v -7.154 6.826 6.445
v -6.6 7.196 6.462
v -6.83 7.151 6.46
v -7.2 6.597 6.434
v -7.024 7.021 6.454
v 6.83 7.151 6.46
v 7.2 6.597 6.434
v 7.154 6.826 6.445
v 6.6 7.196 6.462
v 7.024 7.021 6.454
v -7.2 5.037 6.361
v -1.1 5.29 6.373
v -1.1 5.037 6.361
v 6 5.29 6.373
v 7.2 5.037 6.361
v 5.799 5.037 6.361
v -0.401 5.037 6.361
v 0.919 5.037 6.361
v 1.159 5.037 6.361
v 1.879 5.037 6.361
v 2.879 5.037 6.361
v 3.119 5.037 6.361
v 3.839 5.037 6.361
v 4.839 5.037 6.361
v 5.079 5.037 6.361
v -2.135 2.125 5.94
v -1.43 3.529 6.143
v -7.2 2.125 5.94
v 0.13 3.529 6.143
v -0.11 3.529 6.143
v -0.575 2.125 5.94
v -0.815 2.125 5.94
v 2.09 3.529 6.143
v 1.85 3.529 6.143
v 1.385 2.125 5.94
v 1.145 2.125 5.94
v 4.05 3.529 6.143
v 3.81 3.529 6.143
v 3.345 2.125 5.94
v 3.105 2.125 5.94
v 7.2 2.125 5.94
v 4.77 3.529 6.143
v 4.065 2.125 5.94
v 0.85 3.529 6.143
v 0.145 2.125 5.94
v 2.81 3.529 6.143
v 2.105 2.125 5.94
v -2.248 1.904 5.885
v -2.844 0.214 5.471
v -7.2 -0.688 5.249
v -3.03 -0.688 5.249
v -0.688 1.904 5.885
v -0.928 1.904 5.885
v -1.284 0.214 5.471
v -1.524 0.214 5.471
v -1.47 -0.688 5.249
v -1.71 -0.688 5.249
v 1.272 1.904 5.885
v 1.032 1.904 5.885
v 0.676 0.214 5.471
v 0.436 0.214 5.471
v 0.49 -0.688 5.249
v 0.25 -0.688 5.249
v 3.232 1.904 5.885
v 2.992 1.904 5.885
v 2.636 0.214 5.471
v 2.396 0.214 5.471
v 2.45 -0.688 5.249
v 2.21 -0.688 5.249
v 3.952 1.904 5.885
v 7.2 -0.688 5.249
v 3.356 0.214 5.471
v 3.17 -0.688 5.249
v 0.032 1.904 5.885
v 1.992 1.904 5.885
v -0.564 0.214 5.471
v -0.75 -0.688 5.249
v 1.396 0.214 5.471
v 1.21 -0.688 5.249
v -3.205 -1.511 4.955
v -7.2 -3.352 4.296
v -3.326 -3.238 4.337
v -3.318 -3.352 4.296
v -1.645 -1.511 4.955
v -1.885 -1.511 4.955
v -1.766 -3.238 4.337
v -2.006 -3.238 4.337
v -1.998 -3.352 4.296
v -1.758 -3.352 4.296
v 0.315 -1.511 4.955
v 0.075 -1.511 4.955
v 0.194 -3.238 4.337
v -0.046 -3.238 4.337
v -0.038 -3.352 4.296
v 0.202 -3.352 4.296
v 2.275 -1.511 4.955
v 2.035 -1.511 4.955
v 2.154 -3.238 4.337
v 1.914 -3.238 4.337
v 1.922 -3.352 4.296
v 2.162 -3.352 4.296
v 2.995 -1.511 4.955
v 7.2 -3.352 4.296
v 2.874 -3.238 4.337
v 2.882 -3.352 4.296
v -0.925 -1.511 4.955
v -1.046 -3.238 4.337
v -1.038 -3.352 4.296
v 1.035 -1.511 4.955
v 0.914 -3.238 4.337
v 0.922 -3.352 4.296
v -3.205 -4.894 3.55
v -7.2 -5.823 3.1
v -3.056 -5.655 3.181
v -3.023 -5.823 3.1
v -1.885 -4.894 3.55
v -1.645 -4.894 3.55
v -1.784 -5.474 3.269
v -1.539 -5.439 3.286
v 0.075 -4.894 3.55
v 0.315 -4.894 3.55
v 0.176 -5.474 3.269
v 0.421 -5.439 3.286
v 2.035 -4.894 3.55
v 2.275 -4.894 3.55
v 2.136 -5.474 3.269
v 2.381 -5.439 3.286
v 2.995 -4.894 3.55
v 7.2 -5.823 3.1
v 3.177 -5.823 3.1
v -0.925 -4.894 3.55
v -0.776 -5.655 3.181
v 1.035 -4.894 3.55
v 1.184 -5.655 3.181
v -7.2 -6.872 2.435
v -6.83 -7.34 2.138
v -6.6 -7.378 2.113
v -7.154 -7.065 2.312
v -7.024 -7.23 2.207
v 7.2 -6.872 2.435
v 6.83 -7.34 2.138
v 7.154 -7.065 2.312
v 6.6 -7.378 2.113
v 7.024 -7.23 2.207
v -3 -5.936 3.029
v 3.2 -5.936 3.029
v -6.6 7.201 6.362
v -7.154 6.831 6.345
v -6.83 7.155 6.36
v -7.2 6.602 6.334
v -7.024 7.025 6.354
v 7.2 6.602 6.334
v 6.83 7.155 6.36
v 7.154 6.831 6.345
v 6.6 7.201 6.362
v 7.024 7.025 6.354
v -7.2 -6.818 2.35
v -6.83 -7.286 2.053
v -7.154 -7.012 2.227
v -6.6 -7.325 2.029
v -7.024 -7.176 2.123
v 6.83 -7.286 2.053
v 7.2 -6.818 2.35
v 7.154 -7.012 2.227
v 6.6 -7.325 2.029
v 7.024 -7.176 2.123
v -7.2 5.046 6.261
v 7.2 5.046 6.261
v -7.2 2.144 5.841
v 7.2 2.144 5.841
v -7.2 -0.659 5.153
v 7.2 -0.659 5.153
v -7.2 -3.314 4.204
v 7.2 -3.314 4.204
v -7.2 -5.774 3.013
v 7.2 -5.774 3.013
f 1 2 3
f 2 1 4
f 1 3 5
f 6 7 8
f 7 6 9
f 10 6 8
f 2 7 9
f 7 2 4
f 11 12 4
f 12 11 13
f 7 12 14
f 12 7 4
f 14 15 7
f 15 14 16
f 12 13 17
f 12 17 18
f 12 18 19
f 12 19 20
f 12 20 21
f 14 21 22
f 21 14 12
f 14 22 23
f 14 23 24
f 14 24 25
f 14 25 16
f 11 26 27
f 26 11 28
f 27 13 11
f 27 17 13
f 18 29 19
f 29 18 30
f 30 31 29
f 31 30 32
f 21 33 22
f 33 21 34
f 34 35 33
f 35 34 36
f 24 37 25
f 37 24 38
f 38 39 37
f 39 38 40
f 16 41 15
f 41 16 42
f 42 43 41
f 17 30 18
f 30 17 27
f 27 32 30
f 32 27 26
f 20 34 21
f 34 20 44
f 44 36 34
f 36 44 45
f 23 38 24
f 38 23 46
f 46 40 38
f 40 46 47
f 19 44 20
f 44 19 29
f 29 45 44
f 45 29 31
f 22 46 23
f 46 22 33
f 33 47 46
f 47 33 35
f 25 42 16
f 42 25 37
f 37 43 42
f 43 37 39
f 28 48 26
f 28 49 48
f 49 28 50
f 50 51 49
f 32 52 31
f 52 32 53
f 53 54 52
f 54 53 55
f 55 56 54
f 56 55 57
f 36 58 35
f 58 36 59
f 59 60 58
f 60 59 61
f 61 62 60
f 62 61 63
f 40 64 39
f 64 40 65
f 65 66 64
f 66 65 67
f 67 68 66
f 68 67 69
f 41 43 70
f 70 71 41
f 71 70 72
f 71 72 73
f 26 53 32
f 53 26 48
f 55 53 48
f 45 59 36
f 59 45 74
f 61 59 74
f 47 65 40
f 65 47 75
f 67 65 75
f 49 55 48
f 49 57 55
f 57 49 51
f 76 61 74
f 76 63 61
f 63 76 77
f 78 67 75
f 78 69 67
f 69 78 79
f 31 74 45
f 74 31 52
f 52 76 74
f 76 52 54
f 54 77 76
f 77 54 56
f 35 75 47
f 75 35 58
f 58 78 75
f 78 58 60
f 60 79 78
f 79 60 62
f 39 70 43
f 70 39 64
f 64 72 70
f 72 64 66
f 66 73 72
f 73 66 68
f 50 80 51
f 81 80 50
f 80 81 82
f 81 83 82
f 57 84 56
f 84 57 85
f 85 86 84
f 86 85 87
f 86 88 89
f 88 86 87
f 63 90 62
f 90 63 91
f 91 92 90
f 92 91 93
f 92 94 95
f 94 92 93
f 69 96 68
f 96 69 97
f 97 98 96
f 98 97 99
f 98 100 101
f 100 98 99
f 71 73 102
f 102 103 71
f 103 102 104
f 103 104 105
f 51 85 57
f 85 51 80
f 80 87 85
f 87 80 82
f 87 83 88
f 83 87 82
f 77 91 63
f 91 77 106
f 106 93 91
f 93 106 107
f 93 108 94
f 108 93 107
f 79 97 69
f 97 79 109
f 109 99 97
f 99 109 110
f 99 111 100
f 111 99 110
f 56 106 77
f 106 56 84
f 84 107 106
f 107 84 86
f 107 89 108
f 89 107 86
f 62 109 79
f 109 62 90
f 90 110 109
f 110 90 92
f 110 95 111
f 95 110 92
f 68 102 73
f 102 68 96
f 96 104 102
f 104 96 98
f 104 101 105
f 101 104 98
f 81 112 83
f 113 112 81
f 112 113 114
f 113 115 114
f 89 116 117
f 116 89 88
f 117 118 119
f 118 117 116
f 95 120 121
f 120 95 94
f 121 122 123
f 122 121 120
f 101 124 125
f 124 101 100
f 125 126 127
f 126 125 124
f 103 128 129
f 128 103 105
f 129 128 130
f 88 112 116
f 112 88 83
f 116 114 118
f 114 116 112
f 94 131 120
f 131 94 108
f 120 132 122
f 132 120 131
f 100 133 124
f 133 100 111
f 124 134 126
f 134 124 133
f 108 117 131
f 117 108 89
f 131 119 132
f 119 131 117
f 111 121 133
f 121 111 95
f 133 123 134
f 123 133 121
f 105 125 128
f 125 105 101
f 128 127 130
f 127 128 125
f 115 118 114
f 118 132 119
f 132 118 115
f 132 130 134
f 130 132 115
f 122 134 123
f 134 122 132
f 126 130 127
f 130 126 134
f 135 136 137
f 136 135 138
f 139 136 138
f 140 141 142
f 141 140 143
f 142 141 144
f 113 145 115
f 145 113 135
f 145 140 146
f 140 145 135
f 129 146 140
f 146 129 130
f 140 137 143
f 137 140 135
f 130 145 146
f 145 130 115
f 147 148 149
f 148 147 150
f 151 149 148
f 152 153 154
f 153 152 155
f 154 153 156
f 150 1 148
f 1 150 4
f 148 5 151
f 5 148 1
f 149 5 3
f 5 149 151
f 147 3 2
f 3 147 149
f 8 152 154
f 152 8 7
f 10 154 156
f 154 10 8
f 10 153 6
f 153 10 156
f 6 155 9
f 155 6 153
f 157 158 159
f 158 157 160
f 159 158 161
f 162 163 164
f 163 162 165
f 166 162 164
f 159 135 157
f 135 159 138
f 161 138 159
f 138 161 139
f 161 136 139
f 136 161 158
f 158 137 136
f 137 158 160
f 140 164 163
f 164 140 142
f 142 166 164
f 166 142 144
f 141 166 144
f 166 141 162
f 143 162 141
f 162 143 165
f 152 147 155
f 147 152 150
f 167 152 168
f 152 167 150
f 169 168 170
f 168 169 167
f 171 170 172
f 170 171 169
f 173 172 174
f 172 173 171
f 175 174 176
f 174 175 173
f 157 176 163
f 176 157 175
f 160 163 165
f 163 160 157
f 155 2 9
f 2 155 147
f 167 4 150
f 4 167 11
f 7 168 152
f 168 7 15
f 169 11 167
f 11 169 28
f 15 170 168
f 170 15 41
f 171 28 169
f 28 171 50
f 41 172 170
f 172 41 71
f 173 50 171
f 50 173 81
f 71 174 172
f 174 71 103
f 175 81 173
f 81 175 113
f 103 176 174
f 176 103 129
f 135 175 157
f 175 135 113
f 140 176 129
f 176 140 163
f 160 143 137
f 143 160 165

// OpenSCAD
// file: ../p/1-4cyli.scad
use <../lib.scad>
function ldraw_lib__1_4cyli() = [
// 0 Cylinder 0.25
// 0 Name: 1-4cyli.dat
// 0 Author: James Jessiman
// 0 !LDRAW_ORG Primitive UPDATE 2012-01
// 0 !LICENSE Licensed under CC BY 4.0 : see CAreadme.txt
// 
// 0 BFC CERTIFY CCW
  [0,"BFC","CERTIFY"],
  [0,"BFC","CCW"],
// 
// 0 !HISTORY 2002-03-23 [sbliss] Added BFC statement.
// 0 !HISTORY 2002-04-25 [PTadmin] Official Update 2002-02
// 0 !HISTORY 2007-06-22 [PTadmin] Header formatted for Contributor Agreement
// 0 !HISTORY 2008-07-01 [PTadmin] Official Update 2008-01
// 0 !HISTORY 2012-02-16 [Philo] Changed to CCW
// 0 !HISTORY 2012-03-30 [PTadmin] Official Update 2012-01
// 
// 
// 4 16 1 1 0 0.9239 1 0.3827 0.9239 0 0.3827 1 0 0
  [4,16,1,1,0,0.9239,1,0.3827,0.9239,0,0.3827,1,0,0],
// 5 24 1 0 0 1 1 0 0.9239 0 0.3827 1 0 -1
  [5,24,1,0,0,1,1,0,0.9239,0,0.3827,1,0,-1],
// 4 16 0.9239 1 0.3827 0.7071 1 0.7071 0.7071 0 0.7071 0.9239 0 0.3827
  [4,16,0.9239,1,0.3827,0.7071,1,0.7071,0.7071,0,0.7071,0.9239,0,0.3827],
// 5 24 0.9239 0 0.3827 0.9239 1 0.3827 0.7071 0 0.7071 1 0 0
  [5,24,0.9239,0,0.3827,0.9239,1,0.3827,0.7071,0,0.7071,1,0,0],
// 4 16 0.7071 1 0.7071 0.3827 1 0.9239 0.3827 0 0.9239 0.7071 0 0.7071
  [4,16,0.7071,1,0.7071,0.3827,1,0.9239,0.3827,0,0.9239,0.7071,0,0.7071],
// 5 24 0.7071 0 0.7071 0.7071 1 0.7071 0.3827 0 0.9239 0.9239 0 0.3827
  [5,24,0.7071,0,0.7071,0.7071,1,0.7071,0.3827,0,0.9239,0.9239,0,0.3827],
// 4 16 0.3827 1 0.9239 0 1 1 0 0 1 0.3827 0 0.9239
  [4,16,0.3827,1,0.9239,0,1,1,0,0,1,0.3827,0,0.9239],
// 5 24 0.3827 0 0.9239 0.3827 1 0.9239 0 0 1 0.7071 0 0.7071
  [5,24,0.3827,0,0.9239,0.3827,1,0.9239,0,0,1,0.7071,0,0.7071],
// 5 24 0 0 1 0 1 1 0.3827 0 0.9239 -1 0 1
  [5,24,0,0,1,0,1,1,0.3827,0,0.9239,-1,0,1],
];
module ldraw_lib__1_4cyli(step=0, col=false, unit=2/5, alt=false, line=0.2, solid=!$preview)
    makepoly(ldraw_lib__1_4cyli(), step=step, col=col, unit=unit, alt=alt, line=line, solid=solid);
ldraw_lib__1_4cyli(line=0.2);
// file: ../p/1-4chrd.scad
use <../lib.scad>
function ldraw_lib__1_4chrd() = [
// 0 Chord 0.25
// 0 Name: 1-4chrd.dat
// 0 Author: Max Martin Richter [MMR1988]
// 0 !LDRAW_ORG Primitive UPDATE 2023-05
// 0 !LICENSE Licensed under CC BY 4.0 : see CAreadme.txt
// 
// 0 BFC CERTIFY CCW
  [0,"BFC","CERTIFY"],
  [0,"BFC","CCW"],
// 
// 0 !HISTORY 2004-04-22 [PTadmin] Official Update 2004-02
// 0 !HISTORY 2007-10-09 [PTadmin] Header formatted for Contributor Agreement
// 0 !HISTORY 2008-07-01 [PTadmin] Official Update 2008-01
// 0 !HISTORY 2012-08-02 [MMR1988] Re-creation with PrimGen2 and Rectifier
// 0 !HISTORY 2012-08-09 [PTadmin] Official Update 2012-02
// 0 !HISTORY 2023-10-27 [OrionP] Change author to MMR1988 from hafhead
// 0 !HISTORY 2023-10-31 [OrionP] Official Update 2023-05
// 
// 4 16 0.9239 0 0.3827 0.3827 0 0.9239 0 0 1 1 0 0
  [4,16,0.9239,0,0.3827,0.3827,0,0.9239,0,0,1,1,0,0],
// 3 16 0.7071 0 0.7071 0.3827 0 0.9239 0.9239 0 0.3827
  [3,16,0.7071,0,0.7071,0.3827,0,0.9239,0.9239,0,0.3827],
];
module ldraw_lib__1_4chrd(step=0, col=false, unit=2/5, alt=false, line=0.2, solid=!$preview)
    makepoly(ldraw_lib__1_4chrd(), step=step, col=col, unit=unit, alt=alt, line=line, solid=solid);
ldraw_lib__1_4chrd(line=0.2);
// file: s/6142617ss06.scad
use <../../lib.scad>
use <../../p/1-4chrd.scad>
function ldraw_lib__s__6142617ss06() = [
// 0 ~Sticker  1.9 x  1.8 with Silver Air Vents on Black Background Left - Sixth Face
// 0 Name: s\6142617ss06.dat
// 0 Author: Massimo Maso [Sirio]
// 0 !LDRAW_ORG Subpart UPDATE 2023-05
// 0 !LICENSE Licensed under CC BY 4.0 : see CAreadme.txt
// 
// 0 BFC CERTIFY CCW
  [0,"BFC","CERTIFY"],
  [0,"BFC","CCW"],
// 
// 0 !HISTORY 2023-10-31 [OrionP] Official Update 2023-05
// 
// 
// 0 // Primitives
// 1 0 -16.5 -.25 -3.0901 -1.5 0 0 0 1 0 0 0 -1.5 1-4chrd.dat
  [1,0,-16.5,-.25,-3.0901,-1.5,0,0,0,1,0,0,0,-1.5, ldraw_lib__1_4chrd()],
// 1 0 16.5 -.25 -3.0901 1.5 0 0 0 1 0 0 0 -1.5 1-4chrd.dat
  [1,0,16.5,-.25,-3.0901,1.5,0,0,0,1,0,0,0,-1.5, ldraw_lib__1_4chrd()],
// 0 // Black faces
// 4 0 -18 -.25 -3.0901 -7.5 -.25 -.319 -7.5587 -.25 .0144 -18 -.25 .0144
  [4,0,-18,-.25,-3.0901,-7.5,-.25,-.319,-7.5587,-.25,.0144,-18,-.25,.0144],
// 4 0 -18 -.25 -3.0901 18 -.25 -3.0901 8 -.25 -.319 -7.5 -.25 -.319
  [4,0,-18,-.25,-3.0901,18,-.25,-3.0901,8,-.25,-.319,-7.5,-.25,-.319],
// 4 0 18 -.25 -3.0901 18 -.25 .0144 7.9413 -.25 .0144 8 -.25 -.319
  [4,0,18,-.25,-3.0901,18,-.25,.0144,7.9413,-.25,.0144,8,-.25,-.319],
// 4 0 18 -.25 -3.0901 -18 -.25 -3.0901 -16.5 -.25 -4.5901 16.5 -.25 -4.5901
  [4,0,18,-.25,-3.0901,-18,-.25,-3.0901,-16.5,-.25,-4.5901,16.5,-.25,-4.5901],
// 0 // Silver face
// 4 80 -7.5587 -.25 .0144 -7.5 -.25 -.319 8 -.25 -.319 7.9413 -.25 .0144
  [4,80,-7.5587,-.25,.0144,-7.5,-.25,-.319,8,-.25,-.319,7.9413,-.25,.0144],
];
module ldraw_lib__s__6142617ss06(step=0, col=false, unit=2/5, alt=false, line=0.2, solid=!$preview)
    makepoly(ldraw_lib__s__6142617ss06(), step=step, col=col, unit=unit, alt=alt, line=line, solid=solid);
ldraw_lib__s__6142617ss06(line=0.2);
// file: s/6142617ss05.scad
use <../../lib.scad>
function ldraw_lib__s__6142617ss05() = [
// 0 ~Sticker  1.9 x  1.8 with Silver Air Vents on Black Background Left - Fifth Face
// 0 Name: s\6142617ss05.dat
// 0 Author: Massimo Maso [Sirio]
// 0 !LDRAW_ORG Subpart UPDATE 2023-05
// 0 !LICENSE Licensed under CC BY 4.0 : see CAreadme.txt
// 
// 0 BFC CERTIFY CCW
  [0,"BFC","CERTIFY"],
  [0,"BFC","CCW"],
// 
// 0 !HISTORY 2023-10-31 [OrionP] Official Update 2023-05
// 
// 
// 0 // Black faces
// 3 0 -18 -.25 6.8484 -8.0132 -.25 2.5659 -8.2961 -.25 6.8484
  [3,0,-18,-.25,6.8484,-8.0132,-.25,2.5659,-8.2961,-.25,6.8484],
// 4 0 -18 -.25 6.8484 -18 -.25 -.0144 -7.6409 -.25 .4522 -8.0132 -.25 2.5659
  [4,0,-18,-.25,6.8484,-18,-.25,-.0144,-7.6409,-.25,.4522,-8.0132,-.25,2.5659],
// 3 0 -18 -.25 -.0144 -7.5587 -.25 -.0144 -7.6409 -.25 .4522
  [3,0,-18,-.25,-.0144,-7.5587,-.25,-.0144,-7.6409,-.25,.4522],
// 4 0 -4.7132 -.25 2.5659 -4.1132 -.25 2.5659 -4.3961 -.25 6.8484 -4.9961 -.25 6.8484
  [4,0,-4.7132,-.25,2.5659,-4.1132,-.25,2.5659,-4.3961,-.25,6.8484,-4.9961,-.25,6.8484],
// 4 0 -4.7132 -.25 2.5659 -4.461 -.25 .955 -3.8466 -.25 1.0522 -4.1132 -.25 2.5659
  [4,0,-4.7132,-.25,2.5659,-4.461,-.25,.955,-3.8466,-.25,1.0522,-4.1132,-.25,2.5659],
// 4 0 .1868 -.25 2.5659 .7868 -.25 2.5659 .5039 -.25 6.8484 -.0961 -.25 6.8484
  [4,0,.1868,-.25,2.5659,.7868,-.25,2.5659,.5039,-.25,6.8484,-.0961,-.25,6.8484],
// 4 0 .1868 -.25 2.5659 .439 -.25 .955 1.0534 -.25 1.0522 .7868 -.25 2.5659
  [4,0,.1868,-.25,2.5659,.439,-.25,.955,1.0534,-.25,1.0522,.7868,-.25,2.5659],
// 4 0 5.0868 -.25 2.5659 5.6868 -.25 2.5659 5.4039 -.25 6.8484 4.8039 -.25 6.8484
  [4,0,5.0868,-.25,2.5659,5.6868,-.25,2.5659,5.4039,-.25,6.8484,4.8039,-.25,6.8484],
// 4 0 5.0868 -.25 2.5659 5.339 -.25 .955 5.9534 -.25 1.0522 5.6868 -.25 2.5659
  [4,0,5.0868,-.25,2.5659,5.339,-.25,.955,5.9534,-.25,1.0522,5.6868,-.25,2.5659],
// 4 0 18 -.25 -.0144 18 -.25 6.8484 7.2039 -.25 6.8484 7.4868 -.25 2.5659
  [4,0,18,-.25,-.0144,18,-.25,6.8484,7.2039,-.25,6.8484,7.4868,-.25,2.5659],
// 3 0 18 -.25 -.0144 7.4868 -.25 2.5659 7.9413 -.25 -.0144
  [3,0,18,-.25,-.0144,7.4868,-.25,2.5659,7.9413,-.25,-.0144],
// 0 // Grey faces
// 4 71 -8.0132 -.25 2.5659 -4.7132 -.25 2.5659 -4.9961 -.25 6.8484 -8.2961 -.25 6.8484
  [4,71,-8.0132,-.25,2.5659,-4.7132,-.25,2.5659,-4.9961,-.25,6.8484,-8.2961,-.25,6.8484],
// 4 71 -8.0132 -.25 2.5659 -7.6409 -.25 .4522 -4.461 -.25 .955 -4.7132 -.25 2.5659
  [4,71,-8.0132,-.25,2.5659,-7.6409,-.25,.4522,-4.461,-.25,.955,-4.7132,-.25,2.5659],
// 4 71 -2.3132 -.25 2.5659 .1868 -.25 2.5659 -.0961 -.25 6.8484 -2.5961 -.25 6.8484
  [4,71,-2.3132,-.25,2.5659,.1868,-.25,2.5659,-.0961,-.25,6.8484,-2.5961,-.25,6.8484],
// 4 71 -2.3132 -.25 2.5659 -1.9409 -.25 .4522 .439 -.25 .955 .1868 -.25 2.5659
  [4,71,-2.3132,-.25,2.5659,-1.9409,-.25,.4522,.439,-.25,.955,.1868,-.25,2.5659],
// 4 71 2.5868 -.25 2.5659 5.0868 -.25 2.5659 4.8039 -.25 6.8484 2.3039 -.25 6.8484
  [4,71,2.5868,-.25,2.5659,5.0868,-.25,2.5659,4.8039,-.25,6.8484,2.3039,-.25,6.8484],
// 4 71 2.5868 -.25 2.5659 2.9591 -.25 .4522 5.339 -.25 .955 5.0868 -.25 2.5659
  [4,71,2.5868,-.25,2.5659,2.9591,-.25,.4522,5.339,-.25,.955,5.0868,-.25,2.5659],
// 0 // Silver faces
// 4 80 -4.1132 -.25 2.5659 -2.3132 -.25 2.5659 -2.5961 -.25 6.8484 -4.3961 -.25 6.8484
  [4,80,-4.1132,-.25,2.5659,-2.3132,-.25,2.5659,-2.5961,-.25,6.8484,-4.3961,-.25,6.8484],
// 4 80 -4.1132 -.25 2.5659 -3.8466 -.25 1.0522 -1.9409 -.25 .4522 -2.3132 -.25 2.5659
  [4,80,-4.1132,-.25,2.5659,-3.8466,-.25,1.0522,-1.9409,-.25,.4522,-2.3132,-.25,2.5659],
// 4 80 .7868 -.25 2.5659 2.5868 -.25 2.5659 2.3039 -.25 6.8484 .5039 -.25 6.8484
  [4,80,.7868,-.25,2.5659,2.5868,-.25,2.5659,2.3039,-.25,6.8484,.5039,-.25,6.8484],
// 4 80 .7868 -.25 2.5659 1.0534 -.25 1.0522 2.9591 -.25 .4522 2.5868 -.25 2.5659
  [4,80,.7868,-.25,2.5659,1.0534,-.25,1.0522,2.9591,-.25,.4522,2.5868,-.25,2.5659],
// 4 80 5.6868 -.25 2.5659 7.4868 -.25 2.5659 7.2039 -.25 6.8484 5.4039 -.25 6.8484
  [4,80,5.6868,-.25,2.5659,7.4868,-.25,2.5659,7.2039,-.25,6.8484,5.4039,-.25,6.8484],
// 4 80 5.6868 -.25 2.5659 5.9534 -.25 1.0522 7.9413 -.25 -.0144 7.4868 -.25 2.5659
  [4,80,5.6868,-.25,2.5659,5.9534,-.25,1.0522,7.9413,-.25,-.0144,7.4868,-.25,2.5659],
// 3 80 -7.5587 -.25 -.0144 -4.461 -.25 .955 -7.6409 -.25 .4522
  [3,80,-7.5587,-.25,-.0144,-4.461,-.25,.955,-7.6409,-.25,.4522],
// 4 80 -7.5587 -.25 -.0144 -1.9409 -.25 .4522 -3.8466 -.25 1.0522 -4.461 -.25 .955
  [4,80,-7.5587,-.25,-.0144,-1.9409,-.25,.4522,-3.8466,-.25,1.0522,-4.461,-.25,.955],
// 4 80 -7.5587 -.25 -.0144 7.9413 -.25 -.0144 2.9591 -.25 .4522 -1.9409 -.25 .4522
  [4,80,-7.5587,-.25,-.0144,7.9413,-.25,-.0144,2.9591,-.25,.4522,-1.9409,-.25,.4522],
// 4 80 2.9591 -.25 .4522 1.0534 -.25 1.0522 .439 -.25 .955 -1.9409 -.25 .4522
  [4,80,2.9591,-.25,.4522,1.0534,-.25,1.0522,.439,-.25,.955,-1.9409,-.25,.4522],
// 4 80 2.9591 -.25 .4522 7.9413 -.25 -.0144 5.9534 -.25 1.0522 5.339 -.25 .955
  [4,80,2.9591,-.25,.4522,7.9413,-.25,-.0144,5.9534,-.25,1.0522,5.339,-.25,.955],
];
module ldraw_lib__s__6142617ss05(step=0, col=false, unit=2/5, alt=false, line=0.2, solid=!$preview)
    makepoly(ldraw_lib__s__6142617ss05(), step=step, col=col, unit=unit, alt=alt, line=line, solid=solid);
ldraw_lib__s__6142617ss05(line=0.2);
// file: s/6142617ss04.scad
use <../../lib.scad>
function ldraw_lib__s__6142617ss04() = [
// 0 ~Sticker  1.9 x  1.8 with Silver Air Vents on Black Background Left - Fourth Face
// 0 Name: s\6142617ss04.dat
// 0 Author: Massimo Maso [Sirio]
// 0 !LDRAW_ORG Subpart UPDATE 2023-05
// 0 !LICENSE Licensed under CC BY 4.0 : see CAreadme.txt
// 
// 0 BFC CERTIFY CCW
  [0,"BFC","CERTIFY"],
  [0,"BFC","CCW"],
// 
// 0 !HISTORY 2023-10-31 [OrionP] Official Update 2023-05
// 
// 
// 0 // Black faces
// 3 0 -18 -.25 .0128 -8.0132 -.25 -2.1709 -7.5754 -.25 .0128
  [3,0,-18,-.25,.0128,-8.0132,-.25,-2.1709,-7.5754,-.25,.0128],
// 4 0 -18 -.25 .0128 -18 -.25 -7.061 -8.3161 -.25 -6.7572 -8.0132 -.25 -2.1709
  [4,0,-18,-.25,.0128,-18,-.25,-7.061,-8.3161,-.25,-6.7572,-8.0132,-.25,-2.1709],
// 3 0 -18 -.25 -7.061 -8.2961 -.25 -7.061 -8.3161 -.25 -6.7572
  [3,0,-18,-.25,-7.061,-8.2961,-.25,-7.061,-8.3161,-.25,-6.7572],
// 4 0 -4.7132 -.25 -2.1709 -4.1132 -.25 -2.1709 -3.6754 -.25 .0128 -4.2754 -.25 .0128
  [4,0,-4.7132,-.25,-2.1709,-4.1132,-.25,-2.1709,-3.6754,-.25,.0128,-4.2754,-.25,.0128],
// 4 0 -4.7132 -.25 -2.1709 -5.0161 -.25 -6.7572 -4.4161 -.25 -6.7572 -4.1132 -.25 -2.1709
  [4,0,-4.7132,-.25,-2.1709,-5.0161,-.25,-6.7572,-4.4161,-.25,-6.7572,-4.1132,-.25,-2.1709],
// 4 0 -5.0161 -.25 -6.7572 -4.9961 -.25 -7.061 -4.3961 -.25 -7.061 -4.4161 -.25 -6.7572
  [4,0,-5.0161,-.25,-6.7572,-4.9961,-.25,-7.061,-4.3961,-.25,-7.061,-4.4161,-.25,-6.7572],
// 4 0 .1868 -.25 -2.1709 .7868 -.25 -2.1709 1.2246 -.25 .0128 .6246 -.25 .0128
  [4,0,.1868,-.25,-2.1709,.7868,-.25,-2.1709,1.2246,-.25,.0128,.6246,-.25,.0128],
// 4 0 .1868 -.25 -2.1709 -.1161 -.25 -6.7572 .4839 -.25 -6.7572 .7868 -.25 -2.1709
  [4,0,.1868,-.25,-2.1709,-.1161,-.25,-6.7572,.4839,-.25,-6.7572,.7868,-.25,-2.1709],
// 4 0 -.1161 -.25 -6.7572 -.0961 -.25 -7.061 .5039 -.25 -7.061 .4839 -.25 -6.7572
  [4,0,-.1161,-.25,-6.7572,-.0961,-.25,-7.061,.5039,-.25,-7.061,.4839,-.25,-6.7572],
// 4 0 5.0868 -.25 -2.1709 5.6868 -.25 -2.1709 6.1246 -.25 .0128 5.5246 -.25 .0128
  [4,0,5.0868,-.25,-2.1709,5.6868,-.25,-2.1709,6.1246,-.25,.0128,5.5246,-.25,.0128],
// 4 0 5.0868 -.25 -2.1709 4.7839 -.25 -6.7572 5.3839 -.25 -6.7572 5.6868 -.25 -2.1709
  [4,0,5.0868,-.25,-2.1709,4.7839,-.25,-6.7572,5.3839,-.25,-6.7572,5.6868,-.25,-2.1709],
// 4 0 4.7839 -.25 -6.7572 4.8039 -.25 -7.061 5.4039 -.25 -7.061 5.3839 -.25 -6.7572
  [4,0,4.7839,-.25,-6.7572,4.8039,-.25,-7.061,5.4039,-.25,-7.061,5.3839,-.25,-6.7572],
// 3 0 18 -.25 .0128 7.9246 -.25 .0128 7.4868 -.25 -2.1709
  [3,0,18,-.25,.0128,7.9246,-.25,.0128,7.4868,-.25,-2.1709],
// 4 0 18 -.25 -7.061 18 -.25 .0128 7.4868 -.25 -2.1709 7.1839 -.25 -6.7572
  [4,0,18,-.25,-7.061,18,-.25,.0128,7.4868,-.25,-2.1709,7.1839,-.25,-6.7572],
// 3 0 18 -.25 -7.061 7.1839 -.25 -6.7572 7.2039 -.25 -7.061
  [3,0,18,-.25,-7.061,7.1839,-.25,-6.7572,7.2039,-.25,-7.061],
// 0 // Grey faces
// 4 71 -8.0132 -.25 -2.1709 -4.7132 -.25 -2.1709 -4.2754 -.25 .0128 -7.5754 -.25 .0128
  [4,71,-8.0132,-.25,-2.1709,-4.7132,-.25,-2.1709,-4.2754,-.25,.0128,-7.5754,-.25,.0128],
// 4 71 -8.0132 -.25 -2.1709 -8.3161 -.25 -6.7572 -5.0161 -.25 -6.7572 -4.7132 -.25 -2.1709
  [4,71,-8.0132,-.25,-2.1709,-8.3161,-.25,-6.7572,-5.0161,-.25,-6.7572,-4.7132,-.25,-2.1709],
// 4 71 -8.3161 -.25 -6.7572 -8.2961 -.25 -7.061 -4.9961 -.25 -7.061 -5.0161 -.25 -6.7572
  [4,71,-8.3161,-.25,-6.7572,-8.2961,-.25,-7.061,-4.9961,-.25,-7.061,-5.0161,-.25,-6.7572],
// 4 71 -2.3132 -.25 -2.1709 .1868 -.25 -2.1709 .6246 -.25 .0128 -1.8754 -.25 .0128
  [4,71,-2.3132,-.25,-2.1709,.1868,-.25,-2.1709,.6246,-.25,.0128,-1.8754,-.25,.0128],
// 4 71 -2.3132 -.25 -2.1709 -2.6161 -.25 -6.7572 -.1161 -.25 -6.7572 .1868 -.25 -2.1709
  [4,71,-2.3132,-.25,-2.1709,-2.6161,-.25,-6.7572,-.1161,-.25,-6.7572,.1868,-.25,-2.1709],
// 4 71 -2.6161 -.25 -6.7572 -2.5961 -.25 -7.061 -.0961 -.25 -7.061 -.1161 -.25 -6.7572
  [4,71,-2.6161,-.25,-6.7572,-2.5961,-.25,-7.061,-.0961,-.25,-7.061,-.1161,-.25,-6.7572],
// 4 71 2.5868 -.25 -2.1709 5.0868 -.25 -2.1709 5.5246 -.25 .0128 3.0246 -.25 .0128
  [4,71,2.5868,-.25,-2.1709,5.0868,-.25,-2.1709,5.5246,-.25,.0128,3.0246,-.25,.0128],
// 4 71 2.5868 -.25 -2.1709 2.2839 -.25 -6.7572 4.7839 -.25 -6.7572 5.0868 -.25 -2.1709
  [4,71,2.5868,-.25,-2.1709,2.2839,-.25,-6.7572,4.7839,-.25,-6.7572,5.0868,-.25,-2.1709],
// 4 71 2.2839 -.25 -6.7572 2.3039 -.25 -7.061 4.8039 -.25 -7.061 4.7839 -.25 -6.7572
  [4,71,2.2839,-.25,-6.7572,2.3039,-.25,-7.061,4.8039,-.25,-7.061,4.7839,-.25,-6.7572],
// 0 // Silver faces
// 4 80 -4.1132 -.25 -2.1709 -2.3132 -.25 -2.1709 -1.8754 -.25 .0128 -3.6754 -.25 .0128
  [4,80,-4.1132,-.25,-2.1709,-2.3132,-.25,-2.1709,-1.8754,-.25,.0128,-3.6754,-.25,.0128],
// 4 80 -4.1132 -.25 -2.1709 -4.4161 -.25 -6.7572 -2.6161 -.25 -6.7572 -2.3132 -.25 -2.1709
  [4,80,-4.1132,-.25,-2.1709,-4.4161,-.25,-6.7572,-2.6161,-.25,-6.7572,-2.3132,-.25,-2.1709],
// 4 80 -4.4161 -.25 -6.7572 -4.3961 -.25 -7.061 -2.5961 -.25 -7.061 -2.6161 -.25 -6.7572
  [4,80,-4.4161,-.25,-6.7572,-4.3961,-.25,-7.061,-2.5961,-.25,-7.061,-2.6161,-.25,-6.7572],
// 4 80 .7868 -.25 -2.1709 2.5868 -.25 -2.1709 3.0246 -.25 .0128 1.2246 -.25 .0128
  [4,80,.7868,-.25,-2.1709,2.5868,-.25,-2.1709,3.0246,-.25,.0128,1.2246,-.25,.0128],
// 4 80 .7868 -.25 -2.1709 .4839 -.25 -6.7572 2.2839 -.25 -6.7572 2.5868 -.25 -2.1709
  [4,80,.7868,-.25,-2.1709,.4839,-.25,-6.7572,2.2839,-.25,-6.7572,2.5868,-.25,-2.1709],
// 4 80 .4839 -.25 -6.7572 .5039 -.25 -7.061 2.3039 -.25 -7.061 2.2839 -.25 -6.7572
  [4,80,.4839,-.25,-6.7572,.5039,-.25,-7.061,2.3039,-.25,-7.061,2.2839,-.25,-6.7572],
// 4 80 5.6868 -.25 -2.1709 7.4868 -.25 -2.1709 7.9246 -.25 .0128 6.1246 -.25 .0128
  [4,80,5.6868,-.25,-2.1709,7.4868,-.25,-2.1709,7.9246,-.25,.0128,6.1246,-.25,.0128],
// 4 80 5.6868 -.25 -2.1709 5.3839 -.25 -6.7572 7.1839 -.25 -6.7572 7.4868 -.25 -2.1709
  [4,80,5.6868,-.25,-2.1709,5.3839,-.25,-6.7572,7.1839,-.25,-6.7572,7.4868,-.25,-2.1709],
// 4 80 5.3839 -.25 -6.7572 5.4039 -.25 -7.061 7.2039 -.25 -7.061 7.1839 -.25 -6.7572
  [4,80,5.3839,-.25,-6.7572,5.4039,-.25,-7.061,7.2039,-.25,-7.061,7.1839,-.25,-6.7572],
];
module ldraw_lib__s__6142617ss04(step=0, col=false, unit=2/5, alt=false, line=0.2, solid=!$preview)
    makepoly(ldraw_lib__s__6142617ss04(), step=step, col=col, unit=unit, alt=alt, line=line, solid=solid);
ldraw_lib__s__6142617ss04(line=0.2);
// file: s/6142617ss03.scad
use <../../lib.scad>
function ldraw_lib__s__6142617ss03() = [
// 0 ~Sticker  1.9 x  1.8 with Silver Air Vents on Black Background Left - Third Face
// 0 Name: s\6142617ss03.dat
// 0 Author: Massimo Maso [Sirio]
// 0 !LDRAW_ORG Subpart UPDATE 2023-05
// 0 !LICENSE Licensed under CC BY 4.0 : see CAreadme.txt
// 
// 0 BFC CERTIFY CCW
  [0,"BFC","CERTIFY"],
  [0,"BFC","CCW"],
// 
// 0 !HISTORY 2023-10-31 [OrionP] Official Update 2023-05
// 
// 
// 0 // Black faces
// 3 0 -18 -.25 7.2284 -5.6212 -.25 6.6588 -5.3378 -.25 7.2284
  [3,0,-18,-.25,7.2284,-5.6212,-.25,6.6588,-5.3378,-.25,7.2284],
// 4 0 -18 -.25 7.2284 -18 -.25 -.0128 -7.1097 -.25 2.3102 -5.6212 -.25 6.6588
  [4,0,-18,-.25,7.2284,-18,-.25,-.0128,-7.1097,-.25,2.3102,-5.6212,-.25,6.6588],
// 3 0 -18 -.25 -.0128 -7.5754 -.25 -.0128 -7.1097 -.25 2.3102
  [3,0,-18,-.25,-.0128,-7.5754,-.25,-.0128,-7.1097,-.25,2.3102],
// 4 0 -2.3212 -.25 6.6588 -1.7212 -.25 6.6588 -1.4378 -.25 7.2284 -2.0378 -.25 7.2284
  [4,0,-2.3212,-.25,6.6588,-1.7212,-.25,6.6588,-1.4378,-.25,7.2284,-2.0378,-.25,7.2284],
// 4 0 -2.3212 -.25 6.6588 -3.8097 -.25 2.3102 -3.2097 -.25 2.3102 -1.7212 -.25 6.6588
  [4,0,-2.3212,-.25,6.6588,-3.8097,-.25,2.3102,-3.2097,-.25,2.3102,-1.7212,-.25,6.6588],
// 4 0 -3.8097 -.25 2.3102 -4.2754 -.25 -.0128 -3.6754 -.25 -.0128 -3.2097 -.25 2.3102
  [4,0,-3.8097,-.25,2.3102,-4.2754,-.25,-.0128,-3.6754,-.25,-.0128,-3.2097,-.25,2.3102],
// 4 0 2.5788 -.25 6.6588 3.1788 -.25 6.6588 3.4622 -.25 7.2284 2.8622 -.25 7.2284
  [4,0,2.5788,-.25,6.6588,3.1788,-.25,6.6588,3.4622,-.25,7.2284,2.8622,-.25,7.2284],
// 4 0 2.5788 -.25 6.6588 1.0903 -.25 2.3102 1.6903 -.25 2.3102 3.1788 -.25 6.6588
  [4,0,2.5788,-.25,6.6588,1.0903,-.25,2.3102,1.6903,-.25,2.3102,3.1788,-.25,6.6588],
// 4 0 1.0903 -.25 2.3102 .6246 -.25 -.0128 1.2246 -.25 -.0128 1.6903 -.25 2.3102
  [4,0,1.0903,-.25,2.3102,.6246,-.25,-.0128,1.2246,-.25,-.0128,1.6903,-.25,2.3102],
// 4 0 7.4788 -.25 6.6588 8.0788 -.25 6.6588 8.3622 -.25 7.2284 7.7622 -.25 7.2284
  [4,0,7.4788,-.25,6.6588,8.0788,-.25,6.6588,8.3622,-.25,7.2284,7.7622,-.25,7.2284],
// 4 0 7.4788 -.25 6.6588 5.9903 -.25 2.3102 6.5903 -.25 2.3102 8.0788 -.25 6.6588
  [4,0,7.4788,-.25,6.6588,5.9903,-.25,2.3102,6.5903,-.25,2.3102,8.0788,-.25,6.6588],
// 4 0 5.9903 -.25 2.3102 5.5246 -.25 -.0128 6.1246 -.25 -.0128 6.5903 -.25 2.3102
  [4,0,5.9903,-.25,2.3102,5.5246,-.25,-.0128,6.1246,-.25,-.0128,6.5903,-.25,2.3102],
// 3 0 18 -.25 7.2284 10.1622 -.25 7.2284 9.8788 -.25 6.6588
  [3,0,18,-.25,7.2284,10.1622,-.25,7.2284,9.8788,-.25,6.6588],
// 4 0 18 -.25 -.0128 18 -.25 7.2284 9.8788 -.25 6.6588 8.3903 -.25 2.3102
  [4,0,18,-.25,-.0128,18,-.25,7.2284,9.8788,-.25,6.6588,8.3903,-.25,2.3102],
// 3 0 18 -.25 -.0128 8.3903 -.25 2.3102 7.9246 -.25 -.0128
  [3,0,18,-.25,-.0128,8.3903,-.25,2.3102,7.9246,-.25,-.0128],
// 0 // Dark grey faces
// 4 72 -5.6212 -.25 6.6588 -2.3212 -.25 6.6588 -2.0378 -.25 7.2284 -5.3378 -.25 7.2284
  [4,72,-5.6212,-.25,6.6588,-2.3212,-.25,6.6588,-2.0378,-.25,7.2284,-5.3378,-.25,7.2284],
// 3 72 -3.8097 -.25 2.3102 -2.3212 -.25 6.6588 -5.6212 -.25 6.6588
  [3,72,-3.8097,-.25,2.3102,-2.3212,-.25,6.6588,-5.6212,-.25,6.6588],
// 4 72 .0788 -.25 6.6588 2.5788 -.25 6.6588 2.8622 -.25 7.2284 .3622 -.25 7.2284
  [4,72,.0788,-.25,6.6588,2.5788,-.25,6.6588,2.8622,-.25,7.2284,.3622,-.25,7.2284],
// 3 72 1.0903 -.25 2.3102 2.5788 -.25 6.6588 .0788 -.25 6.6588
  [3,72,1.0903,-.25,2.3102,2.5788,-.25,6.6588,.0788,-.25,6.6588],
// 4 72 4.9788 -.25 6.6588 7.4788 -.25 6.6588 7.7622 -.25 7.2284 5.2622 -.25 7.2284
  [4,72,4.9788,-.25,6.6588,7.4788,-.25,6.6588,7.7622,-.25,7.2284,5.2622,-.25,7.2284],
// 3 72 5.9903 -.25 2.3102 7.4788 -.25 6.6588 4.9788 -.25 6.6588
  [3,72,5.9903,-.25,2.3102,7.4788,-.25,6.6588,4.9788,-.25,6.6588],
// 0 // Grey faces
// 3 71 -7.1097 -.25 2.3102 -3.8097 -.25 2.3102 -5.6212 -.25 6.6588
  [3,71,-7.1097,-.25,2.3102,-3.8097,-.25,2.3102,-5.6212,-.25,6.6588],
// 4 71 -7.1097 -.25 2.3102 -7.5754 -.25 -.0128 -4.2754 -.25 -.0128 -3.8097 -.25 2.3102
  [4,71,-7.1097,-.25,2.3102,-7.5754,-.25,-.0128,-4.2754,-.25,-.0128,-3.8097,-.25,2.3102],
// 3 71 -1.4097 -.25 2.3102 1.0903 -.25 2.3102 .0788 -.25 6.6588
  [3,71,-1.4097,-.25,2.3102,1.0903,-.25,2.3102,.0788,-.25,6.6588],
// 4 71 -1.4097 -.25 2.3102 -1.8754 -.25 -.0128 .6246 -.25 -.0128 1.0903 -.25 2.3102
  [4,71,-1.4097,-.25,2.3102,-1.8754,-.25,-.0128,.6246,-.25,-.0128,1.0903,-.25,2.3102],
// 3 71 3.4903 -.25 2.3102 5.9903 -.25 2.3102 4.9788 -.25 6.6588
  [3,71,3.4903,-.25,2.3102,5.9903,-.25,2.3102,4.9788,-.25,6.6588],
// 4 71 3.4903 -.25 2.3102 3.0246 -.25 -.0128 5.5246 -.25 -.0128 5.9903 -.25 2.3102
  [4,71,3.4903,-.25,2.3102,3.0246,-.25,-.0128,5.5246,-.25,-.0128,5.9903,-.25,2.3102],
// 0 // Silver faces
// 4 80 -1.7212 -.25 6.6588 .0788 -.25 6.6588 .3622 -.25 7.2284 -1.4378 -.25 7.2284
  [4,80,-1.7212,-.25,6.6588,.0788,-.25,6.6588,.3622,-.25,7.2284,-1.4378,-.25,7.2284],
// 4 80 -1.7212 -.25 6.6588 -3.2097 -.25 2.3102 -1.4097 -.25 2.3102 .0788 -.25 6.6588
  [4,80,-1.7212,-.25,6.6588,-3.2097,-.25,2.3102,-1.4097,-.25,2.3102,.0788,-.25,6.6588],
// 4 80 -3.2097 -.25 2.3102 -3.6754 -.25 -.0128 -1.8754 -.25 -.0128 -1.4097 -.25 2.3102
  [4,80,-3.2097,-.25,2.3102,-3.6754,-.25,-.0128,-1.8754,-.25,-.0128,-1.4097,-.25,2.3102],
// 4 80 3.1788 -.25 6.6588 4.9788 -.25 6.6588 5.2622 -.25 7.2284 3.4622 -.25 7.2284
  [4,80,3.1788,-.25,6.6588,4.9788,-.25,6.6588,5.2622,-.25,7.2284,3.4622,-.25,7.2284],
// 4 80 3.1788 -.25 6.6588 1.6903 -.25 2.3102 3.4903 -.25 2.3102 4.9788 -.25 6.6588
  [4,80,3.1788,-.25,6.6588,1.6903,-.25,2.3102,3.4903,-.25,2.3102,4.9788,-.25,6.6588],
// 4 80 1.6903 -.25 2.3102 1.2246 -.25 -.0128 3.0246 -.25 -.0128 3.4903 -.25 2.3102
  [4,80,1.6903,-.25,2.3102,1.2246,-.25,-.0128,3.0246,-.25,-.0128,3.4903,-.25,2.3102],
// 4 80 8.0788 -.25 6.6588 9.8788 -.25 6.6588 10.1622 -.25 7.2284 8.3622 -.25 7.2284
  [4,80,8.0788,-.25,6.6588,9.8788,-.25,6.6588,10.1622,-.25,7.2284,8.3622,-.25,7.2284],
// 4 80 8.0788 -.25 6.6588 6.5903 -.25 2.3102 8.3903 -.25 2.3102 9.8788 -.25 6.6588
  [4,80,8.0788,-.25,6.6588,6.5903,-.25,2.3102,8.3903,-.25,2.3102,9.8788,-.25,6.6588],
// 4 80 6.5903 -.25 2.3102 6.1246 -.25 -.0128 7.9246 -.25 -.0128 8.3903 -.25 2.3102
  [4,80,6.5903,-.25,2.3102,6.1246,-.25,-.0128,7.9246,-.25,-.0128,8.3903,-.25,2.3102],
];
module ldraw_lib__s__6142617ss03(step=0, col=false, unit=2/5, alt=false, line=0.2, solid=!$preview)
    makepoly(ldraw_lib__s__6142617ss03(), step=step, col=col, unit=unit, alt=alt, line=line, solid=solid);
ldraw_lib__s__6142617ss03(line=0.2);
// file: s/6142617ss02.scad
use <../../lib.scad>
function ldraw_lib__s__6142617ss02() = [
// 0 ~Sticker  1.9 x  1.8 with Silver Air Vents on Black Background Left - Second Face
// 0 Name: s\6142617ss02.dat
// 0 Author: Massimo Maso [Sirio]
// 0 !LDRAW_ORG Subpart UPDATE 2023-05
// 0 !LICENSE Licensed under CC BY 4.0 : see CAreadme.txt
// 
// 0 BFC CERTIFY CCW
  [0,"BFC","CERTIFY"],
  [0,"BFC","CCW"],
// 
// 0 !HISTORY 2023-10-31 [OrionP] Official Update 2023-05
// 
// 
// 0 // Black faces
// 4 0 -3.5738 -.25 -3.798 -18 -.25 .0121 -18 -.25 -7.3435 -5.3378 -.25 -7.3435
  [4,0,-3.5738,-.25,-3.798,-18,-.25,.0121,-18,-.25,-7.3435,-5.3378,-.25,-7.3435],
// 3 0 -3.5738 -.25 -3.798 -2.75 -.25 .0121 -18 -.25 .0121
  [3,0,-3.5738,-.25,-3.798,-2.75,-.25,.0121,-18,-.25,.0121],
// 3 0 -3.5738 -.25 -3.798 -1.0028 -.25 .0121 -2.75 -.25 .0121
  [3,0,-3.5738,-.25,-3.798,-1.0028,-.25,.0121,-2.75,-.25,.0121],
// 4 0 -.2738 -.25 -3.798 .3262 -.25 -3.798 2.8972 -.25 .0121 2.2972 -.25 .0121
  [4,0,-.2738,-.25,-3.798,.3262,-.25,-3.798,2.8972,-.25,.0121,2.2972,-.25,.0121],
// 4 0 -.2738 -.25 -3.798 -2.0378 -.25 -7.3435 -1.4378 -.25 -7.3435 .3262 -.25 -3.798
  [4,0,-.2738,-.25,-3.798,-2.0378,-.25,-7.3435,-1.4378,-.25,-7.3435,.3262,-.25,-3.798],
// 4 0 4.6262 -.25 -3.798 5.2262 -.25 -3.798 7.7972 -.25 .0121 7.1972 -.25 .0121
  [4,0,4.6262,-.25,-3.798,5.2262,-.25,-3.798,7.7972,-.25,.0121,7.1972,-.25,.0121],
// 4 0 4.6262 -.25 -3.798 2.8622 -.25 -7.3435 3.4622 -.25 -7.3435 5.2262 -.25 -3.798
  [4,0,4.6262,-.25,-3.798,2.8622,-.25,-7.3435,3.4622,-.25,-7.3435,5.2262,-.25,-3.798],
// 4 0 9.5262 -.25 -3.798 10.1262 -.25 -3.798 12.6972 -.25 .0121 12.0972 -.25 .0121
  [4,0,9.5262,-.25,-3.798,10.1262,-.25,-3.798,12.6972,-.25,.0121,12.0972,-.25,.0121],
// 4 0 9.5262 -.25 -3.798 7.7622 -.25 -7.3435 8.3622 -.25 -7.3435 10.1262 -.25 -3.798
  [4,0,9.5262,-.25,-3.798,7.7622,-.25,-7.3435,8.3622,-.25,-7.3435,10.1262,-.25,-3.798],
// 4 0 11.9262 -.25 -3.798 18 -.25 -7.3435 18 -.25 .0121 14.4972 -.25 .0121
  [4,0,11.9262,-.25,-3.798,18,-.25,-7.3435,18,-.25,.0121,14.4972,-.25,.0121],
// 3 0 11.9262 -.25 -3.798 10.1622 -.25 -7.3435 18 -.25 -7.3435
  [3,0,11.9262,-.25,-3.798,10.1622,-.25,-7.3435,18,-.25,-7.3435],
// 0 // Dark grey faces
// 4 72 -3.5738 -.25 -3.798 -.2738 -.25 -3.798 2.2972 -.25 .0121 -1.0028 -.25 .0121
  [4,72,-3.5738,-.25,-3.798,-.2738,-.25,-3.798,2.2972,-.25,.0121,-1.0028,-.25,.0121],
// 4 72 -3.5738 -.25 -3.798 -5.3378 -.25 -7.3435 -2.0378 -.25 -7.3435 -.2738 -.25 -3.798
  [4,72,-3.5738,-.25,-3.798,-5.3378,-.25,-7.3435,-2.0378,-.25,-7.3435,-.2738,-.25,-3.798],
// 4 72 2.1262 -.25 -3.798 4.6262 -.25 -3.798 7.1972 -.25 .0121 4.6972 -.25 .0121
  [4,72,2.1262,-.25,-3.798,4.6262,-.25,-3.798,7.1972,-.25,.0121,4.6972,-.25,.0121],
// 4 72 2.1262 -.25 -3.798 .3622 -.25 -7.3435 2.8622 -.25 -7.3435 4.6262 -.25 -3.798
  [4,72,2.1262,-.25,-3.798,.3622,-.25,-7.3435,2.8622,-.25,-7.3435,4.6262,-.25,-3.798],
// 4 72 7.0262 -.25 -3.798 9.5262 -.25 -3.798 12.0972 -.25 .0121 9.5972 -.25 .0121
  [4,72,7.0262,-.25,-3.798,9.5262,-.25,-3.798,12.0972,-.25,.0121,9.5972,-.25,.0121],
// 4 72 7.0262 -.25 -3.798 5.2622 -.25 -7.3435 7.7622 -.25 -7.3435 9.5262 -.25 -3.798
  [4,72,7.0262,-.25,-3.798,5.2622,-.25,-7.3435,7.7622,-.25,-7.3435,9.5262,-.25,-3.798],
// 0 // Silver faces
// 4 80 .3262 -.25 -3.798 2.1262 -.25 -3.798 4.6972 -.25 .0121 2.8972 -.25 .0121
  [4,80,.3262,-.25,-3.798,2.1262,-.25,-3.798,4.6972,-.25,.0121,2.8972,-.25,.0121],
// 4 80 .3262 -.25 -3.798 -1.4378 -.25 -7.3435 .3622 -.25 -7.3435 2.1262 -.25 -3.798
  [4,80,.3262,-.25,-3.798,-1.4378,-.25,-7.3435,.3622,-.25,-7.3435,2.1262,-.25,-3.798],
// 4 80 5.2262 -.25 -3.798 7.0262 -.25 -3.798 9.5972 -.25 .0121 7.7972 -.25 .0121
  [4,80,5.2262,-.25,-3.798,7.0262,-.25,-3.798,9.5972,-.25,.0121,7.7972,-.25,.0121],
// 4 80 5.2262 -.25 -3.798 3.4622 -.25 -7.3435 5.2622 -.25 -7.3435 7.0262 -.25 -3.798
  [4,80,5.2262,-.25,-3.798,3.4622,-.25,-7.3435,5.2622,-.25,-7.3435,7.0262,-.25,-3.798],
// 4 80 10.1262 -.25 -3.798 11.9262 -.25 -3.798 14.4972 -.25 .0121 12.6972 -.25 .0121
  [4,80,10.1262,-.25,-3.798,11.9262,-.25,-3.798,14.4972,-.25,.0121,12.6972,-.25,.0121],
// 4 80 10.1262 -.25 -3.798 8.3622 -.25 -7.3435 10.1622 -.25 -7.3435 11.9262 -.25 -3.798
  [4,80,10.1262,-.25,-3.798,8.3622,-.25,-7.3435,10.1622,-.25,-7.3435,11.9262,-.25,-3.798],
];
module ldraw_lib__s__6142617ss02(step=0, col=false, unit=2/5, alt=false, line=0.2, solid=!$preview)
    makepoly(ldraw_lib__s__6142617ss02(), step=step, col=col, unit=unit, alt=alt, line=line, solid=solid);
ldraw_lib__s__6142617ss02(line=0.2);
// file: s/6142617ss01.scad
use <../../lib.scad>
use <../../p/1-4chrd.scad>
function ldraw_lib__s__6142617ss01() = [
// 0 ~Sticker  1.9 x  1.8 with Silver Air Vents on Black Background Left - First Face
// 0 Name: s\6142617ss01.dat
// 0 Author: Massimo Maso [Sirio]
// 0 !LDRAW_ORG Subpart UPDATE 2023-05
// 0 !LICENSE Licensed under CC BY 4.0 : see CAreadme.txt
// 
// 0 BFC CERTIFY CCW
  [0,"BFC","CERTIFY"],
  [0,"BFC","CCW"],
// 
// 0 !HISTORY 2023-10-31 [OrionP] Official Update 2023-05
// 
// 
// 0 // Primitives
// 1 0 -16.5 -.25 3.8922 -1.5 0 0 0 1 0 0 0 1.5 1-4chrd.dat
  [1,0,-16.5,-.25,3.8922,-1.5,0,0,0,1,0,0,0,1.5, ldraw_lib__1_4chrd()],
// 1 0 16.5 -.25 3.8922 1.5 0 0 0 1 0 0 0 1.5 1-4chrd.dat
  [1,0,16.5,-.25,3.8922,1.5,0,0,0,1,0,0,0,1.5, ldraw_lib__1_4chrd()],
// 0 // Black faces
// 4 0 -18 -.25 3.8922 18 -.25 3.8922 16.5 -.25 5.3922 -16.5 -.25 5.3922
  [4,0,-18,-.25,3.8922,18,-.25,3.8922,16.5,-.25,5.3922,-16.5,-.25,5.3922],
// 4 0 -18 -.25 3.8922 -18 -.25 -.0121 -2.75 -.25 -.0121 -2.75 -.25 .6211
  [4,0,-18,-.25,3.8922,-18,-.25,-.0121,-2.75,-.25,-.0121,-2.75,-.25,.6211],
// 4 0 18 -.25 3.8922 -18 -.25 3.8922 -2.75 -.25 .6211 15 -.25 .6211
  [4,0,18,-.25,3.8922,-18,-.25,3.8922,-2.75,-.25,.6211,15,-.25,.6211],
// 4 0 18 -.25 3.8922 15 -.25 .6211 14.4972 -.25 -.0121 18 -.25 -.0121
  [4,0,18,-.25,3.8922,15,-.25,.6211,14.4972,-.25,-.0121,18,-.25,-.0121],
// 0 // Silver faces
// 3 80 -2.75 -.25 .6211 -2.75 -.25 -.0121 -1.0028 -.25 -.0121
  [3,80,-2.75,-.25,.6211,-2.75,-.25,-.0121,-1.0028,-.25,-.0121],
// 3 80 -2.75 -.25 .6211 -1.0028 -.25 -.0121 2.2972 -.25 -.0121
  [3,80,-2.75,-.25,.6211,-1.0028,-.25,-.0121,2.2972,-.25,-.0121],
// 3 80 -2.75 -.25 .6211 2.2972 -.25 -.0121 2.8972 -.25 -.0121
  [3,80,-2.75,-.25,.6211,2.2972,-.25,-.0121,2.8972,-.25,-.0121],
// 3 80 -2.75 -.25 .6211 2.8972 -.25 -.0121 4.6972 -.25 -.0121
  [3,80,-2.75,-.25,.6211,2.8972,-.25,-.0121,4.6972,-.25,-.0121],
// 3 80 -2.75 -.25 .6211 4.6972 -.25 -.0121 7.1972 -.25 -.0121
  [3,80,-2.75,-.25,.6211,4.6972,-.25,-.0121,7.1972,-.25,-.0121],
// 4 80 -2.75 -.25 .6211 7.1972 -.25 -.0121 7.7972 -.25 -.0121 15 -.25 .6211
  [4,80,-2.75,-.25,.6211,7.1972,-.25,-.0121,7.7972,-.25,-.0121,15,-.25,.6211],
// 3 80 15 -.25 .6211 7.7972 -.25 -.0121 9.5972 -.25 -.0121
  [3,80,15,-.25,.6211,7.7972,-.25,-.0121,9.5972,-.25,-.0121],
// 3 80 15 -.25 .6211 9.5972 -.25 -.0121 12.0972 -.25 -.0121
  [3,80,15,-.25,.6211,9.5972,-.25,-.0121,12.0972,-.25,-.0121],
// 3 80 15 -.25 .6211 12.0972 -.25 -.0121 12.6972 -.25 -.0121
  [3,80,15,-.25,.6211,12.0972,-.25,-.0121,12.6972,-.25,-.0121],
// 3 80 15 -.25 .6211 12.6972 -.25 -.0121 14.4972 -.25 -.0121
  [3,80,15,-.25,.6211,12.6972,-.25,-.0121,14.4972,-.25,-.0121],
];
module ldraw_lib__s__6142617ss01(step=0, col=false, unit=2/5, alt=false, line=0.2, solid=!$preview)
    makepoly(ldraw_lib__s__6142617ss01(), step=step, col=col, unit=unit, alt=alt, line=line, solid=solid);
ldraw_lib__s__6142617ss01(line=0.2);
// main file
use <../lib.scad>
use <s/6142617ss01.scad>
use <s/6142617ss02.scad>
use <s/6142617ss03.scad>
use <s/6142617ss04.scad>
use <s/6142617ss05.scad>
use <s/6142617ss06.scad>
use <s/6142617ss08.scad>
function ldraw_lib__6142617sc01() = [
// 0 Sticker  1.9 x  1.8 with Silver Air Vents on Black Background Left (Formed) (Needs work)
// 0 Name: 6142617sc01.dat
// 0 Author: Massimo Maso [Sirio]
// 0 !LDRAW_ORG Part UPDATE 2023-05
// 0 !LICENSE Licensed under CC BY 4.0 : see CAreadme.txt
// 
// 0 !HELP Needs work: Some parts should be halftones.
// 0 !HELP The transition from dark grey to grey should be done less clearly.
// 
// 0 BFC CERTIFY CCW
  [0,"BFC","CERTIFY"],
  [0,"BFC","CCW"],
// 
// 0 !KEYWORDS 1969, Camaro, Chevrolet, Drag, Race, Set 75874, Speed Champions
// 0 !KEYWORDS Z/28
// 
// 0 !HISTORY 2023-10-31 [OrionP] Official Update 2023-05
// 
// 
// 1 16 0 -15.6524 12.616 1 0 0 0 .998894 -.047023 0 .047023 .998894 s\6142617ss01.dat
  [1,16,0,-15.6524,12.616,1,0,0,0,.998894,-.047023,0,.047023,.998894, ldraw_lib__s__6142617ss01()],
// 1 16 0 -15.6524 12.616 1 0 0 0 .989715 -.143056 0 .143056 .989715 s\6142617ss02.dat
  [1,16,0,-15.6524,12.616,1,0,0,0,.989715,-.143056,0,.143056,.989715, ldraw_lib__s__6142617ss02()],
// 1 16 0 -12.8827 -1.648 1 0 0 0 .971148 -.238478 0 .238478 .971148 s\6142617ss03.dat
  [1,16,0,-12.8827,-1.648,1,0,0,0,.971148,-.238478,0,.238478,.971148, ldraw_lib__s__6142617ss03()],
// 1 16 0 -12.8827 -1.648 1 0 0 0 .941616 -.336689 0 .336689 .941616 s\6142617ss04.dat
  [1,16,0,-12.8827,-1.648,1,0,0,0,.941616,-.336689,0,.336689,.941616, ldraw_lib__s__6142617ss04()],
// 1 16 0 -7.5316 -14.436 1 0 0 0 .900072 -.435742 0 .435742 .900072 s\6142617ss05.dat
  [1,16,0,-7.5316,-14.436,1,0,0,0,.900072,-.435742,0,.435742,.900072, ldraw_lib__s__6142617ss05()],
// 1 16 0 -7.5316 -14.436 1 0 0 0 .844289 -.535889 0 .535889 .844289 s\6142617ss06.dat
  [1,16,0,-7.5316,-14.436,1,0,0,0,.844289,-.535889,0,.535889,.844289, ldraw_lib__s__6142617ss06()],
// 1 16 0 0 0 1 0 0 0 1 0 0 0 1 s\6142617ss08.dat
  [1,16,0,0,0,1,0,0,0,1,0,0,0,1, ldraw_lib__s__6142617ss08()],
];
module ldraw_lib__6142617sc01(step=0, col=false, unit=2/5, alt=false, line=0.2, solid=!$preview)
    makepoly(ldraw_lib__6142617sc01(), step=step, col=col, unit=unit, alt=alt, line=line, solid=solid);
ldraw_lib__6142617sc01(line=0.2);
